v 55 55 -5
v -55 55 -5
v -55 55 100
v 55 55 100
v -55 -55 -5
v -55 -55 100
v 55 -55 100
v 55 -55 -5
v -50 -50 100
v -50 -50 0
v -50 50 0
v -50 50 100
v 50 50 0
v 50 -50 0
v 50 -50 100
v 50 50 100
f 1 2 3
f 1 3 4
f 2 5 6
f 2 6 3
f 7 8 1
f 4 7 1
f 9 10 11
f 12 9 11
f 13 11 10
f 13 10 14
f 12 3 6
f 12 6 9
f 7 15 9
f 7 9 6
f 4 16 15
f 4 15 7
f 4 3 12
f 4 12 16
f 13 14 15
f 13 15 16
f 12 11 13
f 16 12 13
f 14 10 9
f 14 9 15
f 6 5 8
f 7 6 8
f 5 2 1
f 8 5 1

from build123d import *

# Parameters (mm, degrees)
F0_W     = 100
F0_H     = 100
F1_DEPTH = 100
F2_T     = 5


with BuildPart() as f1:
    # F0 (on Top) → F1 (new body)
    with BuildSketch(Plane.XY):
        Rectangle(F0_W, F0_H)
    extrude(amount=F1_DEPTH)

    # F2
    f2_openings = [f1.faces().sort_by_distance(p)[0] for p in [
        (0, 0, 100),
    ]]
    offset(amount=F2_T, openings=f2_openings, kind=Kind.INTERSECTION)


solid = f1.part
